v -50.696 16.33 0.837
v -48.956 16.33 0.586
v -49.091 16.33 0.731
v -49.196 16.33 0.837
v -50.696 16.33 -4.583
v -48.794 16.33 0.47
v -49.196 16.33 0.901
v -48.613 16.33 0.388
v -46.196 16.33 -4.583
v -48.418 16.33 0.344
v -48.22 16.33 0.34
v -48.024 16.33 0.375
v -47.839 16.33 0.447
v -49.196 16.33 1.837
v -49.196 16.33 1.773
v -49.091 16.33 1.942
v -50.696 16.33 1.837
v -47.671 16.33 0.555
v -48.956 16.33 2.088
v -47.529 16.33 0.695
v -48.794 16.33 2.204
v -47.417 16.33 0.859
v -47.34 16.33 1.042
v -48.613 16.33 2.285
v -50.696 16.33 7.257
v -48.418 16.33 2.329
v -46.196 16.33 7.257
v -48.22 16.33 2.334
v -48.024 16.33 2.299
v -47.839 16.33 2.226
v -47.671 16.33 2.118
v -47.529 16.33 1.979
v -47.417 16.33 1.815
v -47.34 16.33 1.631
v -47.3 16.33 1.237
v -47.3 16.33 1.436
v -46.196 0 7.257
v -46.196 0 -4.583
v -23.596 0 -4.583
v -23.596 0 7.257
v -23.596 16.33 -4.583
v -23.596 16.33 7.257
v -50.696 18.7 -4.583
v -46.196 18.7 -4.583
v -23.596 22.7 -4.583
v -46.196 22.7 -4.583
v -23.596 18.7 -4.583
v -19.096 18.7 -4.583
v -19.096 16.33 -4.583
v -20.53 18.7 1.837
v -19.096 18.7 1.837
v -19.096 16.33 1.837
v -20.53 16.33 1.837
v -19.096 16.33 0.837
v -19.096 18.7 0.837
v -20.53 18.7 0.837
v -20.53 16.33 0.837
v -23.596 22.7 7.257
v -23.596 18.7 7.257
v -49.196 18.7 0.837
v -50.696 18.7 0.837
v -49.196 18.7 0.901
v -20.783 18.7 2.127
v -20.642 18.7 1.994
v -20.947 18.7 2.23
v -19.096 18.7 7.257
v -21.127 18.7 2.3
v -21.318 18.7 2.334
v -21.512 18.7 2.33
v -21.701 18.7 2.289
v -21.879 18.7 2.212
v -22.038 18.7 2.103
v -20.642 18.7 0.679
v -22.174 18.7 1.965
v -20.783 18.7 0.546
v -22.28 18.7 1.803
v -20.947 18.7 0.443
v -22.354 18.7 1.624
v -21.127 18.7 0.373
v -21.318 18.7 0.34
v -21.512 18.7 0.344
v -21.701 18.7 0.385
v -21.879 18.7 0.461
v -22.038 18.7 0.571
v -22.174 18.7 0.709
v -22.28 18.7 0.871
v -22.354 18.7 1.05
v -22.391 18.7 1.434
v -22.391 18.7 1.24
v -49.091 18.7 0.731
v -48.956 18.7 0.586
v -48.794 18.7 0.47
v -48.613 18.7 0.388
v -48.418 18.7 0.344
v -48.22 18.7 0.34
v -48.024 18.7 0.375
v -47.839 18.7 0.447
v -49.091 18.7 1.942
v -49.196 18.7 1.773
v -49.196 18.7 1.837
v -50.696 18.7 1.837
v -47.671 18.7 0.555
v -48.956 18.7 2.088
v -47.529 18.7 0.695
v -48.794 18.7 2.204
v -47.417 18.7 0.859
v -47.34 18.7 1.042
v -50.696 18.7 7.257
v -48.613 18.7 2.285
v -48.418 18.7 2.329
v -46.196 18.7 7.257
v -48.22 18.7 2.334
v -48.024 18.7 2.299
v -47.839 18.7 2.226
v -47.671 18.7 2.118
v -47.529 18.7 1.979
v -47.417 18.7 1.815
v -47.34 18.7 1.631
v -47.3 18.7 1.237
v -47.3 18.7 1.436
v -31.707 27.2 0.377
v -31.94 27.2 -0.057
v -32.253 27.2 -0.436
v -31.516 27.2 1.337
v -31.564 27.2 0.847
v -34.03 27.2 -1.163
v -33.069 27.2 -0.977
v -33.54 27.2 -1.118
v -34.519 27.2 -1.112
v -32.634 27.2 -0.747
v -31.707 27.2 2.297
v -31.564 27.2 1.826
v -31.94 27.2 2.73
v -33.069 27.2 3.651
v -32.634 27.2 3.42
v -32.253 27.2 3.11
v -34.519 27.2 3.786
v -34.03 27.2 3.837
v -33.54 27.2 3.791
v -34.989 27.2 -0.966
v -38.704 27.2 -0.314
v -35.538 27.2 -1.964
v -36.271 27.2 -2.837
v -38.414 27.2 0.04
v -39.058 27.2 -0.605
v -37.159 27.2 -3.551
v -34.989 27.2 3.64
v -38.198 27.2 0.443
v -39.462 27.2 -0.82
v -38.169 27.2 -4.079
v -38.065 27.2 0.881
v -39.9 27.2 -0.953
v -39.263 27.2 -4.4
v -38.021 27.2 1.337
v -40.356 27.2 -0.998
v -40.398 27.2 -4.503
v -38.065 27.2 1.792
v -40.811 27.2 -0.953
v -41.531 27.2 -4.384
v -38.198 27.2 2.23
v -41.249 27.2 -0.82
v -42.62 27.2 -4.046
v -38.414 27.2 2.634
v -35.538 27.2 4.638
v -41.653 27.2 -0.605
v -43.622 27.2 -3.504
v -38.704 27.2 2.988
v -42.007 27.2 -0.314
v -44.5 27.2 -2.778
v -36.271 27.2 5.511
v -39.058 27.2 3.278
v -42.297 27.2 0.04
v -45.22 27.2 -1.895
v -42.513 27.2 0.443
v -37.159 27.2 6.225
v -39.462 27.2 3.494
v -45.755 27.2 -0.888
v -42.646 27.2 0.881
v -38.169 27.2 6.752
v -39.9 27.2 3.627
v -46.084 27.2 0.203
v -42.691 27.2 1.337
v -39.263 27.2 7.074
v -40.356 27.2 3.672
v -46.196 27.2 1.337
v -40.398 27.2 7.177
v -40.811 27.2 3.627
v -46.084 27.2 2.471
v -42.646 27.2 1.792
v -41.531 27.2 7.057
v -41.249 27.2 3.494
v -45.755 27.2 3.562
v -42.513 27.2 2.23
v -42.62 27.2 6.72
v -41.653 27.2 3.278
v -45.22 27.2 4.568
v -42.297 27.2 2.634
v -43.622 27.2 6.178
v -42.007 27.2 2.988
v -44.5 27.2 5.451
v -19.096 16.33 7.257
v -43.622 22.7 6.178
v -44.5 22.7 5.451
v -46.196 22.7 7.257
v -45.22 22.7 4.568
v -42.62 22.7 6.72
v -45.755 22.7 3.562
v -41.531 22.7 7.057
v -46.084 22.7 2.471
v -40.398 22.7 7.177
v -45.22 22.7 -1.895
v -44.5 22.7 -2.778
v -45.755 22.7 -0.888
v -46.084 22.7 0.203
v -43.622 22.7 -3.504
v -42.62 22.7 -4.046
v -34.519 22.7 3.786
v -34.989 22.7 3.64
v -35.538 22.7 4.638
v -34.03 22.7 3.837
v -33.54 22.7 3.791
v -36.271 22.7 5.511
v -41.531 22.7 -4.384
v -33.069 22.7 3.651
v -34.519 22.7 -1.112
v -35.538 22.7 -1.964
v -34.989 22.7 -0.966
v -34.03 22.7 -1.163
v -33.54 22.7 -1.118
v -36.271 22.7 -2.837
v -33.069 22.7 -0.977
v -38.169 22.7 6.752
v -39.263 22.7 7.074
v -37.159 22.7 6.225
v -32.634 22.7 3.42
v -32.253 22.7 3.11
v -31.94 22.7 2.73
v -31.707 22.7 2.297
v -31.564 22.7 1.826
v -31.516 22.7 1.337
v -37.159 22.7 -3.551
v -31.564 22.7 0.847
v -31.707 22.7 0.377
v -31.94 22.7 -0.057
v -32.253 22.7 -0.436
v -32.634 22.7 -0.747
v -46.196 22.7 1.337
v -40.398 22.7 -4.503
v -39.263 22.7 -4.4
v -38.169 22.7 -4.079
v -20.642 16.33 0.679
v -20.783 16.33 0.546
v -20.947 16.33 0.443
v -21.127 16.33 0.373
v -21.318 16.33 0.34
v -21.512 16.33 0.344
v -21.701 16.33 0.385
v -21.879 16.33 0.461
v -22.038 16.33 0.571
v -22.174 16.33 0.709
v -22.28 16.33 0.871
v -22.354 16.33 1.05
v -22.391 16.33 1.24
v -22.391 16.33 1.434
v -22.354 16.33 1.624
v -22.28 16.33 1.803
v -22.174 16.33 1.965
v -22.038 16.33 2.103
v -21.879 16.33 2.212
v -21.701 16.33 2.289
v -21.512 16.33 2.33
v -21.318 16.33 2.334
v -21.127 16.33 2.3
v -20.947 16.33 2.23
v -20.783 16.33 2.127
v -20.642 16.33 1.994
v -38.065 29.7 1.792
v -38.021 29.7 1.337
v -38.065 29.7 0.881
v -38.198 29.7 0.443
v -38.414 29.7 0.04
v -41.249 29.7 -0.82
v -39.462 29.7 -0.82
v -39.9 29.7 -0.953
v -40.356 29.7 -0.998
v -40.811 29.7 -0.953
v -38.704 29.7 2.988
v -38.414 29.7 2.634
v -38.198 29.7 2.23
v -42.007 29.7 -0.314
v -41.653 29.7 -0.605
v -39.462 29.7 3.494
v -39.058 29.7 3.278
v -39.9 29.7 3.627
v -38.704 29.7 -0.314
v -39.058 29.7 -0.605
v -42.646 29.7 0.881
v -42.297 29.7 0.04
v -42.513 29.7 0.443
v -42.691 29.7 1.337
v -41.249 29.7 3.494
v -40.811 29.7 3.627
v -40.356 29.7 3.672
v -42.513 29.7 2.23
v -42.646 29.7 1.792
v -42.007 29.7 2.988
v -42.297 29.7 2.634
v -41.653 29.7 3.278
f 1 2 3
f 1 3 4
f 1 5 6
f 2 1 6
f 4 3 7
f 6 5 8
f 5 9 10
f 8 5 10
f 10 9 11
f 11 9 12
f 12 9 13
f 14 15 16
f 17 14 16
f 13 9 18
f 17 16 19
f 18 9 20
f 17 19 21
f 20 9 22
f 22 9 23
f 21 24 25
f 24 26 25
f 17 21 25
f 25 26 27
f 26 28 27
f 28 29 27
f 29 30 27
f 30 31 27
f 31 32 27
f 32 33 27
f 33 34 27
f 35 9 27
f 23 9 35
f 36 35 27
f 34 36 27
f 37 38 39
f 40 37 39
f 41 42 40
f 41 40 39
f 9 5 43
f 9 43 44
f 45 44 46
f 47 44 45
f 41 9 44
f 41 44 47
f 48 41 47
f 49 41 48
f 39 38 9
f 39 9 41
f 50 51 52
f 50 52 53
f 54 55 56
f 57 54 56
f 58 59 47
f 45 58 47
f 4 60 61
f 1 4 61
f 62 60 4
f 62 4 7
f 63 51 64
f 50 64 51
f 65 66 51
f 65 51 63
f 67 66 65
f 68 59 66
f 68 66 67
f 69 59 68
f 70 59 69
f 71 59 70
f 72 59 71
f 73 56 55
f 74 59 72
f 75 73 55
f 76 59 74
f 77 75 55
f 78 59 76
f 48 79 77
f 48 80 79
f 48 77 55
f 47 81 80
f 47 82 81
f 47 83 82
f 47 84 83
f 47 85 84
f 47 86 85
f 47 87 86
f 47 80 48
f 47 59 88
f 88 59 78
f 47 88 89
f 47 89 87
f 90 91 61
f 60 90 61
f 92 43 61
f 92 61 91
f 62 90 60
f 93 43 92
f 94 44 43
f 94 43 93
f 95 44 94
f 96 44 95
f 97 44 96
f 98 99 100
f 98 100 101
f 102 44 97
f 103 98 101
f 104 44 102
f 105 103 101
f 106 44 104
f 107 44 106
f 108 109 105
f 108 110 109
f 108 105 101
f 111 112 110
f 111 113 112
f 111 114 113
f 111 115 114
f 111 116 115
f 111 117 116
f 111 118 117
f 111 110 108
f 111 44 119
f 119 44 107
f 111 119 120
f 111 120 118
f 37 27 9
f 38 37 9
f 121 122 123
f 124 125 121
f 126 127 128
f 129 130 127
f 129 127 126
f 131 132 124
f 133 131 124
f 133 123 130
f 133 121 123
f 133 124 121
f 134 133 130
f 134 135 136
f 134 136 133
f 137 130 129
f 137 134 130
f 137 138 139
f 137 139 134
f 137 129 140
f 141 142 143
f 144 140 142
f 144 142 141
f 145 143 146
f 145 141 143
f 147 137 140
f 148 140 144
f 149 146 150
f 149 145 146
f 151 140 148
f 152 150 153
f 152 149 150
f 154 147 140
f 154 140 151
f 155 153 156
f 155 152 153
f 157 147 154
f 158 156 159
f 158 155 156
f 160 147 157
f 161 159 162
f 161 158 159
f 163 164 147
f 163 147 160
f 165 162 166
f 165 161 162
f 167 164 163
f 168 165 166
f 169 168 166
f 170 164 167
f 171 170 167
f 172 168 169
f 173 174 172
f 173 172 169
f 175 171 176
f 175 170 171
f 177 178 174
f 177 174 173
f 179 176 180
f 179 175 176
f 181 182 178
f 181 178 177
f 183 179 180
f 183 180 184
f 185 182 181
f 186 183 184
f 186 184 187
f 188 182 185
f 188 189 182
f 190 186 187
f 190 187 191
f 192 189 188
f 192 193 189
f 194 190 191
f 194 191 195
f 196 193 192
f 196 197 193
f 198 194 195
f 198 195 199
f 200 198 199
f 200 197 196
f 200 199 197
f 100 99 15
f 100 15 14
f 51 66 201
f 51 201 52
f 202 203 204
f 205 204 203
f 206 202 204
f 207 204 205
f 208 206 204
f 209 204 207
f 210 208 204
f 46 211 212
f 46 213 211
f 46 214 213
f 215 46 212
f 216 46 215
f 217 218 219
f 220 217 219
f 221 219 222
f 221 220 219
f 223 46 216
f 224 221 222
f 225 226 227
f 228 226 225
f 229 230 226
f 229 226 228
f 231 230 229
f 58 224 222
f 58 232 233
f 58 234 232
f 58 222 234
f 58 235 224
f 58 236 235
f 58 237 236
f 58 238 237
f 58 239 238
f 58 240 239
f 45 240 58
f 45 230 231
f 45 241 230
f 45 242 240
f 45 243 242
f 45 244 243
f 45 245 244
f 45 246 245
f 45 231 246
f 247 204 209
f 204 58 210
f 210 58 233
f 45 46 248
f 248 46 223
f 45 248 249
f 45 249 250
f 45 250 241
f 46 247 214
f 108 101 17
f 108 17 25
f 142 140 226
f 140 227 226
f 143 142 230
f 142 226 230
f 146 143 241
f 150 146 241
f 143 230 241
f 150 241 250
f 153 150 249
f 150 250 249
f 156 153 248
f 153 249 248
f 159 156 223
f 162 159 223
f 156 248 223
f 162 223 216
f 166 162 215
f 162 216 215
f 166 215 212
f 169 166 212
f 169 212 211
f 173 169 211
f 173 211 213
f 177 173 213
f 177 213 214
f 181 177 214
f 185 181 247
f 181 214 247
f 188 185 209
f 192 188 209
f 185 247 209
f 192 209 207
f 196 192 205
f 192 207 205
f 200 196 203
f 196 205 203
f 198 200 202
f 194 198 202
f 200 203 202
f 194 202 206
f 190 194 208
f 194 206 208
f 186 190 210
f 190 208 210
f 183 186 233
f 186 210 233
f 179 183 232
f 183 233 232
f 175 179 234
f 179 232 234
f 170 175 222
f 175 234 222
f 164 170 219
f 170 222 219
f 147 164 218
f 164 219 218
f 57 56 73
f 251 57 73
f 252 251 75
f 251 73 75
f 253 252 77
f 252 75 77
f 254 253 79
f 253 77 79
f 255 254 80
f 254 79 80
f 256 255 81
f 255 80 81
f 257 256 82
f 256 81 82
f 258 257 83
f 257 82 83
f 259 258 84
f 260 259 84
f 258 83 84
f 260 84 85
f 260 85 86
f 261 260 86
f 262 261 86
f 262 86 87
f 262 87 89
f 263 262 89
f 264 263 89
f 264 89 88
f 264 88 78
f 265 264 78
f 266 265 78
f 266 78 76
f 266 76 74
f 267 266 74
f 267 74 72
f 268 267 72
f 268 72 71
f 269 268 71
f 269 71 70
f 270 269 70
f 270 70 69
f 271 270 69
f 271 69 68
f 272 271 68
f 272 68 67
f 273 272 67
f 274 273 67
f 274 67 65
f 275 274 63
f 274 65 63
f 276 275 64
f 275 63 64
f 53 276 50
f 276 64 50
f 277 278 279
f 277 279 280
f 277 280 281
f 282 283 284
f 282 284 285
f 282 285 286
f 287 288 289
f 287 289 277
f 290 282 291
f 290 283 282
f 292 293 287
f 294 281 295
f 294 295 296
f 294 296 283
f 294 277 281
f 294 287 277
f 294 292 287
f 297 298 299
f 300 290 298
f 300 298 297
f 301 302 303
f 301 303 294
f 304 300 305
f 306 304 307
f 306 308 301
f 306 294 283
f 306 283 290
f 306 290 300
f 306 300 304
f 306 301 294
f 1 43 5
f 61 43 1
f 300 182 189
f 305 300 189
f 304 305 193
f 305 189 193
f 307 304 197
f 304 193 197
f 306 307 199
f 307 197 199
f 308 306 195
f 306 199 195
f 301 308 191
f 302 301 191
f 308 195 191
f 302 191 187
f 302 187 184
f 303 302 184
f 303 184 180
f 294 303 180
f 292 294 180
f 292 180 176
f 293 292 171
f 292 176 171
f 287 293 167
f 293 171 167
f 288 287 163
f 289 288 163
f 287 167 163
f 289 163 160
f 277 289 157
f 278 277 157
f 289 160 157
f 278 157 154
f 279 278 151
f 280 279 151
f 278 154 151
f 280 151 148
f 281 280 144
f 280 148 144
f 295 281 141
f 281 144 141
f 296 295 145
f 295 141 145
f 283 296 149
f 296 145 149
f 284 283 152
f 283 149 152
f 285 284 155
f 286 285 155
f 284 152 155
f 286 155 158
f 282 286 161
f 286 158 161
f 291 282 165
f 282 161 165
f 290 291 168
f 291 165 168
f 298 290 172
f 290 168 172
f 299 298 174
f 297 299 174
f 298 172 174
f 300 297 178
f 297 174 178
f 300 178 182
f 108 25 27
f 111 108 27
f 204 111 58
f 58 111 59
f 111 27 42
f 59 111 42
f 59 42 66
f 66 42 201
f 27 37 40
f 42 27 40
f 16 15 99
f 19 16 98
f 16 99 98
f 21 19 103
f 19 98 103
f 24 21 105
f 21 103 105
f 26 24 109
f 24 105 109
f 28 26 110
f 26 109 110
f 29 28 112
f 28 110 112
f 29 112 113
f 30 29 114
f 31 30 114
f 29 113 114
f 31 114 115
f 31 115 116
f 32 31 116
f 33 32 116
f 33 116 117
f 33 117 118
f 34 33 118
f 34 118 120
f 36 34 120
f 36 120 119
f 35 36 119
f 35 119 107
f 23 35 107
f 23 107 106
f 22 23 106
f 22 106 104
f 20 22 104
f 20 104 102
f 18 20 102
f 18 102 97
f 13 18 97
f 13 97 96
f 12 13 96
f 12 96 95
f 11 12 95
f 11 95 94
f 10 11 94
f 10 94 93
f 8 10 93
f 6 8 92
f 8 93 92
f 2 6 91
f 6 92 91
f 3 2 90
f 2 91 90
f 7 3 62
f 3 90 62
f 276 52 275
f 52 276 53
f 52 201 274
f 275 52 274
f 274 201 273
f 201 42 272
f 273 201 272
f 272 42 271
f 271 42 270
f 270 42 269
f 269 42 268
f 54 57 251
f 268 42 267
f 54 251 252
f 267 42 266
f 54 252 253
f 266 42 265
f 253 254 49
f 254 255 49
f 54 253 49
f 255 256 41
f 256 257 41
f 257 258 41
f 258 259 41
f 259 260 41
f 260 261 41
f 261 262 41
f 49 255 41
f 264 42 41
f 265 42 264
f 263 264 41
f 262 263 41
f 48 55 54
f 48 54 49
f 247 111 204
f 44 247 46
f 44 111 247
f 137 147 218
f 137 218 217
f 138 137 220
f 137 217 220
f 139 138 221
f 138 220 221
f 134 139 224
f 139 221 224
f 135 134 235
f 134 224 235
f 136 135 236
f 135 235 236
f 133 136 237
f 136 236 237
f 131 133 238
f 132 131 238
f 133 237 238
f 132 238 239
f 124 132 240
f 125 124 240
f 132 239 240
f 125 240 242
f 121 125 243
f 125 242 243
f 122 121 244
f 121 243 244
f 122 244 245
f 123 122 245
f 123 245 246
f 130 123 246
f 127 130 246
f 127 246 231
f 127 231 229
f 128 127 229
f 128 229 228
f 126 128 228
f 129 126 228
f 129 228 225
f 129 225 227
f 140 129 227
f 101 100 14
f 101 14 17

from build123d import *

# Parameters (mm, degrees)
SKETCH1_W            = 22.6
SKETCH1_H            = 11.84
BOSS_EXTRUDE1_DEPTH  = 22.7
SKETCH4_R            = 5.84
BOSS_EXTRUDE6_DEPTH  = 4.5
SKETCH12_R           = 2.335
BOSS_EXTRUDE7_DEPTH  = 2.5
SKETCH13_R           = 2.5
BOSS_EXTRUDE8_DEPTH  = 4.5
SKETCH14_W           = 11.84
SKETCH14_H           = 2.37
BOSS_EXTRUDE10_DEPTH = 4.5
SKETCH15_R           = 1
SKETCH15_W           = 1.5
SKETCH15_H           = 1
CUT_EXTRUDE3_DEPTH   = 19.7
SKETCH16_W           = 11.84
SKETCH16_H           = 2.37
BOSS_EXTRUDE11_DEPTH = 4.5
SKETCH17_R           = 1
SKETCH17_W           = 1.5
SKETCH17_H           = 1
CUT_EXTRUDE4_DEPTH   = 19.7


with BuildPart() as part:
    # Sketch1 → Boss-Extrude1 (new body)
    with BuildSketch(Plane(origin=(0, 0, 0), x_dir=(1, 0, 0), z_dir=(0, 1, 0))):
        with Locations((-34.895532414, -1.336861806)):
            Rectangle(SKETCH1_W, SKETCH1_H)
    extrude(amount=BOSS_EXTRUDE1_DEPTH)

    # Sketch4 → Boss-Extrude6 (add)
    with BuildSketch(Plane(origin=(0, 22.7, 0), x_dir=(-1, 0, 0), z_dir=(0, 1, 0))):
        with Locations((40.355532414, 1.336861806)):
            Circle(SKETCH4_R)
    extrude(amount=BOSS_EXTRUDE6_DEPTH)

    # Sketch12 → Boss-Extrude7 (add)
    with BuildSketch(Plane(origin=(0, 27.2, 0), x_dir=(-1, 0, 0), z_dir=(0, 1, 0))):
        with Locations((40.355532414, 1.336861806)):
            Circle(SKETCH12_R)
    extrude(amount=BOSS_EXTRUDE7_DEPTH)

    # Sketch13 → Boss-Extrude8 (add)
    with BuildSketch(Plane(origin=(0, 22.7, 0), x_dir=(-1, 0, 0), z_dir=(0, 1, 0))):
        with Locations((34.015532414, 1.336861806)):
            Circle(SKETCH13_R)
    extrude(amount=BOSS_EXTRUDE8_DEPTH)

    # Sketch14 → Boss-Extrude10 (add)
    with BuildSketch(Plane(origin=(-23.595532414, 0, 0), x_dir=(0, 0, -1), z_dir=(1, 0, 0))):
        with Locations((-1.336861806, 17.515)):
            Rectangle(SKETCH14_W, SKETCH14_H)
    extrude(amount=BOSS_EXTRUDE10_DEPTH)

    # Sketch15 → Cut-Extrude3 (cut, through all)
    with BuildSketch(Plane(origin=(0, 18.7, 0), x_dir=(-1, 0, 0), z_dir=(0, 1, 0))):
        with Locations((21.395532414, 1.336861806)):
            Circle(SKETCH15_R)
        with Locations((48.395532414, 1.336861806)):
            Circle(SKETCH15_R)
        with Locations((19.845532414, 1.336861806)):
            Rectangle(SKETCH15_W, SKETCH15_H)
    extrude(amount=-CUT_EXTRUDE3_DEPTH, mode=Mode.SUBTRACT)

    # Sketch16 → Boss-Extrude11 (add)
    with BuildSketch(Plane.ZY.offset(46.195532414)):
        with Locations((1.336861806, 17.515)):
            Rectangle(SKETCH16_W, SKETCH16_H)
    extrude(amount=BOSS_EXTRUDE11_DEPTH)

    # Sketch17 → Cut-Extrude4 (cut, through all)
    with BuildSketch(Plane(origin=(0, 18.7, 0), x_dir=(-1, 0, 0), z_dir=(0, 1, 0))):
        with Locations((48.295532414, 1.336861806)):
            Circle(SKETCH17_R)
        with Locations((49.945532414, 1.336861806)):
            Rectangle(SKETCH17_W, SKETCH17_H)
    extrude(amount=-CUT_EXTRUDE4_DEPTH, mode=Mode.SUBTRACT)


solid = part.part
